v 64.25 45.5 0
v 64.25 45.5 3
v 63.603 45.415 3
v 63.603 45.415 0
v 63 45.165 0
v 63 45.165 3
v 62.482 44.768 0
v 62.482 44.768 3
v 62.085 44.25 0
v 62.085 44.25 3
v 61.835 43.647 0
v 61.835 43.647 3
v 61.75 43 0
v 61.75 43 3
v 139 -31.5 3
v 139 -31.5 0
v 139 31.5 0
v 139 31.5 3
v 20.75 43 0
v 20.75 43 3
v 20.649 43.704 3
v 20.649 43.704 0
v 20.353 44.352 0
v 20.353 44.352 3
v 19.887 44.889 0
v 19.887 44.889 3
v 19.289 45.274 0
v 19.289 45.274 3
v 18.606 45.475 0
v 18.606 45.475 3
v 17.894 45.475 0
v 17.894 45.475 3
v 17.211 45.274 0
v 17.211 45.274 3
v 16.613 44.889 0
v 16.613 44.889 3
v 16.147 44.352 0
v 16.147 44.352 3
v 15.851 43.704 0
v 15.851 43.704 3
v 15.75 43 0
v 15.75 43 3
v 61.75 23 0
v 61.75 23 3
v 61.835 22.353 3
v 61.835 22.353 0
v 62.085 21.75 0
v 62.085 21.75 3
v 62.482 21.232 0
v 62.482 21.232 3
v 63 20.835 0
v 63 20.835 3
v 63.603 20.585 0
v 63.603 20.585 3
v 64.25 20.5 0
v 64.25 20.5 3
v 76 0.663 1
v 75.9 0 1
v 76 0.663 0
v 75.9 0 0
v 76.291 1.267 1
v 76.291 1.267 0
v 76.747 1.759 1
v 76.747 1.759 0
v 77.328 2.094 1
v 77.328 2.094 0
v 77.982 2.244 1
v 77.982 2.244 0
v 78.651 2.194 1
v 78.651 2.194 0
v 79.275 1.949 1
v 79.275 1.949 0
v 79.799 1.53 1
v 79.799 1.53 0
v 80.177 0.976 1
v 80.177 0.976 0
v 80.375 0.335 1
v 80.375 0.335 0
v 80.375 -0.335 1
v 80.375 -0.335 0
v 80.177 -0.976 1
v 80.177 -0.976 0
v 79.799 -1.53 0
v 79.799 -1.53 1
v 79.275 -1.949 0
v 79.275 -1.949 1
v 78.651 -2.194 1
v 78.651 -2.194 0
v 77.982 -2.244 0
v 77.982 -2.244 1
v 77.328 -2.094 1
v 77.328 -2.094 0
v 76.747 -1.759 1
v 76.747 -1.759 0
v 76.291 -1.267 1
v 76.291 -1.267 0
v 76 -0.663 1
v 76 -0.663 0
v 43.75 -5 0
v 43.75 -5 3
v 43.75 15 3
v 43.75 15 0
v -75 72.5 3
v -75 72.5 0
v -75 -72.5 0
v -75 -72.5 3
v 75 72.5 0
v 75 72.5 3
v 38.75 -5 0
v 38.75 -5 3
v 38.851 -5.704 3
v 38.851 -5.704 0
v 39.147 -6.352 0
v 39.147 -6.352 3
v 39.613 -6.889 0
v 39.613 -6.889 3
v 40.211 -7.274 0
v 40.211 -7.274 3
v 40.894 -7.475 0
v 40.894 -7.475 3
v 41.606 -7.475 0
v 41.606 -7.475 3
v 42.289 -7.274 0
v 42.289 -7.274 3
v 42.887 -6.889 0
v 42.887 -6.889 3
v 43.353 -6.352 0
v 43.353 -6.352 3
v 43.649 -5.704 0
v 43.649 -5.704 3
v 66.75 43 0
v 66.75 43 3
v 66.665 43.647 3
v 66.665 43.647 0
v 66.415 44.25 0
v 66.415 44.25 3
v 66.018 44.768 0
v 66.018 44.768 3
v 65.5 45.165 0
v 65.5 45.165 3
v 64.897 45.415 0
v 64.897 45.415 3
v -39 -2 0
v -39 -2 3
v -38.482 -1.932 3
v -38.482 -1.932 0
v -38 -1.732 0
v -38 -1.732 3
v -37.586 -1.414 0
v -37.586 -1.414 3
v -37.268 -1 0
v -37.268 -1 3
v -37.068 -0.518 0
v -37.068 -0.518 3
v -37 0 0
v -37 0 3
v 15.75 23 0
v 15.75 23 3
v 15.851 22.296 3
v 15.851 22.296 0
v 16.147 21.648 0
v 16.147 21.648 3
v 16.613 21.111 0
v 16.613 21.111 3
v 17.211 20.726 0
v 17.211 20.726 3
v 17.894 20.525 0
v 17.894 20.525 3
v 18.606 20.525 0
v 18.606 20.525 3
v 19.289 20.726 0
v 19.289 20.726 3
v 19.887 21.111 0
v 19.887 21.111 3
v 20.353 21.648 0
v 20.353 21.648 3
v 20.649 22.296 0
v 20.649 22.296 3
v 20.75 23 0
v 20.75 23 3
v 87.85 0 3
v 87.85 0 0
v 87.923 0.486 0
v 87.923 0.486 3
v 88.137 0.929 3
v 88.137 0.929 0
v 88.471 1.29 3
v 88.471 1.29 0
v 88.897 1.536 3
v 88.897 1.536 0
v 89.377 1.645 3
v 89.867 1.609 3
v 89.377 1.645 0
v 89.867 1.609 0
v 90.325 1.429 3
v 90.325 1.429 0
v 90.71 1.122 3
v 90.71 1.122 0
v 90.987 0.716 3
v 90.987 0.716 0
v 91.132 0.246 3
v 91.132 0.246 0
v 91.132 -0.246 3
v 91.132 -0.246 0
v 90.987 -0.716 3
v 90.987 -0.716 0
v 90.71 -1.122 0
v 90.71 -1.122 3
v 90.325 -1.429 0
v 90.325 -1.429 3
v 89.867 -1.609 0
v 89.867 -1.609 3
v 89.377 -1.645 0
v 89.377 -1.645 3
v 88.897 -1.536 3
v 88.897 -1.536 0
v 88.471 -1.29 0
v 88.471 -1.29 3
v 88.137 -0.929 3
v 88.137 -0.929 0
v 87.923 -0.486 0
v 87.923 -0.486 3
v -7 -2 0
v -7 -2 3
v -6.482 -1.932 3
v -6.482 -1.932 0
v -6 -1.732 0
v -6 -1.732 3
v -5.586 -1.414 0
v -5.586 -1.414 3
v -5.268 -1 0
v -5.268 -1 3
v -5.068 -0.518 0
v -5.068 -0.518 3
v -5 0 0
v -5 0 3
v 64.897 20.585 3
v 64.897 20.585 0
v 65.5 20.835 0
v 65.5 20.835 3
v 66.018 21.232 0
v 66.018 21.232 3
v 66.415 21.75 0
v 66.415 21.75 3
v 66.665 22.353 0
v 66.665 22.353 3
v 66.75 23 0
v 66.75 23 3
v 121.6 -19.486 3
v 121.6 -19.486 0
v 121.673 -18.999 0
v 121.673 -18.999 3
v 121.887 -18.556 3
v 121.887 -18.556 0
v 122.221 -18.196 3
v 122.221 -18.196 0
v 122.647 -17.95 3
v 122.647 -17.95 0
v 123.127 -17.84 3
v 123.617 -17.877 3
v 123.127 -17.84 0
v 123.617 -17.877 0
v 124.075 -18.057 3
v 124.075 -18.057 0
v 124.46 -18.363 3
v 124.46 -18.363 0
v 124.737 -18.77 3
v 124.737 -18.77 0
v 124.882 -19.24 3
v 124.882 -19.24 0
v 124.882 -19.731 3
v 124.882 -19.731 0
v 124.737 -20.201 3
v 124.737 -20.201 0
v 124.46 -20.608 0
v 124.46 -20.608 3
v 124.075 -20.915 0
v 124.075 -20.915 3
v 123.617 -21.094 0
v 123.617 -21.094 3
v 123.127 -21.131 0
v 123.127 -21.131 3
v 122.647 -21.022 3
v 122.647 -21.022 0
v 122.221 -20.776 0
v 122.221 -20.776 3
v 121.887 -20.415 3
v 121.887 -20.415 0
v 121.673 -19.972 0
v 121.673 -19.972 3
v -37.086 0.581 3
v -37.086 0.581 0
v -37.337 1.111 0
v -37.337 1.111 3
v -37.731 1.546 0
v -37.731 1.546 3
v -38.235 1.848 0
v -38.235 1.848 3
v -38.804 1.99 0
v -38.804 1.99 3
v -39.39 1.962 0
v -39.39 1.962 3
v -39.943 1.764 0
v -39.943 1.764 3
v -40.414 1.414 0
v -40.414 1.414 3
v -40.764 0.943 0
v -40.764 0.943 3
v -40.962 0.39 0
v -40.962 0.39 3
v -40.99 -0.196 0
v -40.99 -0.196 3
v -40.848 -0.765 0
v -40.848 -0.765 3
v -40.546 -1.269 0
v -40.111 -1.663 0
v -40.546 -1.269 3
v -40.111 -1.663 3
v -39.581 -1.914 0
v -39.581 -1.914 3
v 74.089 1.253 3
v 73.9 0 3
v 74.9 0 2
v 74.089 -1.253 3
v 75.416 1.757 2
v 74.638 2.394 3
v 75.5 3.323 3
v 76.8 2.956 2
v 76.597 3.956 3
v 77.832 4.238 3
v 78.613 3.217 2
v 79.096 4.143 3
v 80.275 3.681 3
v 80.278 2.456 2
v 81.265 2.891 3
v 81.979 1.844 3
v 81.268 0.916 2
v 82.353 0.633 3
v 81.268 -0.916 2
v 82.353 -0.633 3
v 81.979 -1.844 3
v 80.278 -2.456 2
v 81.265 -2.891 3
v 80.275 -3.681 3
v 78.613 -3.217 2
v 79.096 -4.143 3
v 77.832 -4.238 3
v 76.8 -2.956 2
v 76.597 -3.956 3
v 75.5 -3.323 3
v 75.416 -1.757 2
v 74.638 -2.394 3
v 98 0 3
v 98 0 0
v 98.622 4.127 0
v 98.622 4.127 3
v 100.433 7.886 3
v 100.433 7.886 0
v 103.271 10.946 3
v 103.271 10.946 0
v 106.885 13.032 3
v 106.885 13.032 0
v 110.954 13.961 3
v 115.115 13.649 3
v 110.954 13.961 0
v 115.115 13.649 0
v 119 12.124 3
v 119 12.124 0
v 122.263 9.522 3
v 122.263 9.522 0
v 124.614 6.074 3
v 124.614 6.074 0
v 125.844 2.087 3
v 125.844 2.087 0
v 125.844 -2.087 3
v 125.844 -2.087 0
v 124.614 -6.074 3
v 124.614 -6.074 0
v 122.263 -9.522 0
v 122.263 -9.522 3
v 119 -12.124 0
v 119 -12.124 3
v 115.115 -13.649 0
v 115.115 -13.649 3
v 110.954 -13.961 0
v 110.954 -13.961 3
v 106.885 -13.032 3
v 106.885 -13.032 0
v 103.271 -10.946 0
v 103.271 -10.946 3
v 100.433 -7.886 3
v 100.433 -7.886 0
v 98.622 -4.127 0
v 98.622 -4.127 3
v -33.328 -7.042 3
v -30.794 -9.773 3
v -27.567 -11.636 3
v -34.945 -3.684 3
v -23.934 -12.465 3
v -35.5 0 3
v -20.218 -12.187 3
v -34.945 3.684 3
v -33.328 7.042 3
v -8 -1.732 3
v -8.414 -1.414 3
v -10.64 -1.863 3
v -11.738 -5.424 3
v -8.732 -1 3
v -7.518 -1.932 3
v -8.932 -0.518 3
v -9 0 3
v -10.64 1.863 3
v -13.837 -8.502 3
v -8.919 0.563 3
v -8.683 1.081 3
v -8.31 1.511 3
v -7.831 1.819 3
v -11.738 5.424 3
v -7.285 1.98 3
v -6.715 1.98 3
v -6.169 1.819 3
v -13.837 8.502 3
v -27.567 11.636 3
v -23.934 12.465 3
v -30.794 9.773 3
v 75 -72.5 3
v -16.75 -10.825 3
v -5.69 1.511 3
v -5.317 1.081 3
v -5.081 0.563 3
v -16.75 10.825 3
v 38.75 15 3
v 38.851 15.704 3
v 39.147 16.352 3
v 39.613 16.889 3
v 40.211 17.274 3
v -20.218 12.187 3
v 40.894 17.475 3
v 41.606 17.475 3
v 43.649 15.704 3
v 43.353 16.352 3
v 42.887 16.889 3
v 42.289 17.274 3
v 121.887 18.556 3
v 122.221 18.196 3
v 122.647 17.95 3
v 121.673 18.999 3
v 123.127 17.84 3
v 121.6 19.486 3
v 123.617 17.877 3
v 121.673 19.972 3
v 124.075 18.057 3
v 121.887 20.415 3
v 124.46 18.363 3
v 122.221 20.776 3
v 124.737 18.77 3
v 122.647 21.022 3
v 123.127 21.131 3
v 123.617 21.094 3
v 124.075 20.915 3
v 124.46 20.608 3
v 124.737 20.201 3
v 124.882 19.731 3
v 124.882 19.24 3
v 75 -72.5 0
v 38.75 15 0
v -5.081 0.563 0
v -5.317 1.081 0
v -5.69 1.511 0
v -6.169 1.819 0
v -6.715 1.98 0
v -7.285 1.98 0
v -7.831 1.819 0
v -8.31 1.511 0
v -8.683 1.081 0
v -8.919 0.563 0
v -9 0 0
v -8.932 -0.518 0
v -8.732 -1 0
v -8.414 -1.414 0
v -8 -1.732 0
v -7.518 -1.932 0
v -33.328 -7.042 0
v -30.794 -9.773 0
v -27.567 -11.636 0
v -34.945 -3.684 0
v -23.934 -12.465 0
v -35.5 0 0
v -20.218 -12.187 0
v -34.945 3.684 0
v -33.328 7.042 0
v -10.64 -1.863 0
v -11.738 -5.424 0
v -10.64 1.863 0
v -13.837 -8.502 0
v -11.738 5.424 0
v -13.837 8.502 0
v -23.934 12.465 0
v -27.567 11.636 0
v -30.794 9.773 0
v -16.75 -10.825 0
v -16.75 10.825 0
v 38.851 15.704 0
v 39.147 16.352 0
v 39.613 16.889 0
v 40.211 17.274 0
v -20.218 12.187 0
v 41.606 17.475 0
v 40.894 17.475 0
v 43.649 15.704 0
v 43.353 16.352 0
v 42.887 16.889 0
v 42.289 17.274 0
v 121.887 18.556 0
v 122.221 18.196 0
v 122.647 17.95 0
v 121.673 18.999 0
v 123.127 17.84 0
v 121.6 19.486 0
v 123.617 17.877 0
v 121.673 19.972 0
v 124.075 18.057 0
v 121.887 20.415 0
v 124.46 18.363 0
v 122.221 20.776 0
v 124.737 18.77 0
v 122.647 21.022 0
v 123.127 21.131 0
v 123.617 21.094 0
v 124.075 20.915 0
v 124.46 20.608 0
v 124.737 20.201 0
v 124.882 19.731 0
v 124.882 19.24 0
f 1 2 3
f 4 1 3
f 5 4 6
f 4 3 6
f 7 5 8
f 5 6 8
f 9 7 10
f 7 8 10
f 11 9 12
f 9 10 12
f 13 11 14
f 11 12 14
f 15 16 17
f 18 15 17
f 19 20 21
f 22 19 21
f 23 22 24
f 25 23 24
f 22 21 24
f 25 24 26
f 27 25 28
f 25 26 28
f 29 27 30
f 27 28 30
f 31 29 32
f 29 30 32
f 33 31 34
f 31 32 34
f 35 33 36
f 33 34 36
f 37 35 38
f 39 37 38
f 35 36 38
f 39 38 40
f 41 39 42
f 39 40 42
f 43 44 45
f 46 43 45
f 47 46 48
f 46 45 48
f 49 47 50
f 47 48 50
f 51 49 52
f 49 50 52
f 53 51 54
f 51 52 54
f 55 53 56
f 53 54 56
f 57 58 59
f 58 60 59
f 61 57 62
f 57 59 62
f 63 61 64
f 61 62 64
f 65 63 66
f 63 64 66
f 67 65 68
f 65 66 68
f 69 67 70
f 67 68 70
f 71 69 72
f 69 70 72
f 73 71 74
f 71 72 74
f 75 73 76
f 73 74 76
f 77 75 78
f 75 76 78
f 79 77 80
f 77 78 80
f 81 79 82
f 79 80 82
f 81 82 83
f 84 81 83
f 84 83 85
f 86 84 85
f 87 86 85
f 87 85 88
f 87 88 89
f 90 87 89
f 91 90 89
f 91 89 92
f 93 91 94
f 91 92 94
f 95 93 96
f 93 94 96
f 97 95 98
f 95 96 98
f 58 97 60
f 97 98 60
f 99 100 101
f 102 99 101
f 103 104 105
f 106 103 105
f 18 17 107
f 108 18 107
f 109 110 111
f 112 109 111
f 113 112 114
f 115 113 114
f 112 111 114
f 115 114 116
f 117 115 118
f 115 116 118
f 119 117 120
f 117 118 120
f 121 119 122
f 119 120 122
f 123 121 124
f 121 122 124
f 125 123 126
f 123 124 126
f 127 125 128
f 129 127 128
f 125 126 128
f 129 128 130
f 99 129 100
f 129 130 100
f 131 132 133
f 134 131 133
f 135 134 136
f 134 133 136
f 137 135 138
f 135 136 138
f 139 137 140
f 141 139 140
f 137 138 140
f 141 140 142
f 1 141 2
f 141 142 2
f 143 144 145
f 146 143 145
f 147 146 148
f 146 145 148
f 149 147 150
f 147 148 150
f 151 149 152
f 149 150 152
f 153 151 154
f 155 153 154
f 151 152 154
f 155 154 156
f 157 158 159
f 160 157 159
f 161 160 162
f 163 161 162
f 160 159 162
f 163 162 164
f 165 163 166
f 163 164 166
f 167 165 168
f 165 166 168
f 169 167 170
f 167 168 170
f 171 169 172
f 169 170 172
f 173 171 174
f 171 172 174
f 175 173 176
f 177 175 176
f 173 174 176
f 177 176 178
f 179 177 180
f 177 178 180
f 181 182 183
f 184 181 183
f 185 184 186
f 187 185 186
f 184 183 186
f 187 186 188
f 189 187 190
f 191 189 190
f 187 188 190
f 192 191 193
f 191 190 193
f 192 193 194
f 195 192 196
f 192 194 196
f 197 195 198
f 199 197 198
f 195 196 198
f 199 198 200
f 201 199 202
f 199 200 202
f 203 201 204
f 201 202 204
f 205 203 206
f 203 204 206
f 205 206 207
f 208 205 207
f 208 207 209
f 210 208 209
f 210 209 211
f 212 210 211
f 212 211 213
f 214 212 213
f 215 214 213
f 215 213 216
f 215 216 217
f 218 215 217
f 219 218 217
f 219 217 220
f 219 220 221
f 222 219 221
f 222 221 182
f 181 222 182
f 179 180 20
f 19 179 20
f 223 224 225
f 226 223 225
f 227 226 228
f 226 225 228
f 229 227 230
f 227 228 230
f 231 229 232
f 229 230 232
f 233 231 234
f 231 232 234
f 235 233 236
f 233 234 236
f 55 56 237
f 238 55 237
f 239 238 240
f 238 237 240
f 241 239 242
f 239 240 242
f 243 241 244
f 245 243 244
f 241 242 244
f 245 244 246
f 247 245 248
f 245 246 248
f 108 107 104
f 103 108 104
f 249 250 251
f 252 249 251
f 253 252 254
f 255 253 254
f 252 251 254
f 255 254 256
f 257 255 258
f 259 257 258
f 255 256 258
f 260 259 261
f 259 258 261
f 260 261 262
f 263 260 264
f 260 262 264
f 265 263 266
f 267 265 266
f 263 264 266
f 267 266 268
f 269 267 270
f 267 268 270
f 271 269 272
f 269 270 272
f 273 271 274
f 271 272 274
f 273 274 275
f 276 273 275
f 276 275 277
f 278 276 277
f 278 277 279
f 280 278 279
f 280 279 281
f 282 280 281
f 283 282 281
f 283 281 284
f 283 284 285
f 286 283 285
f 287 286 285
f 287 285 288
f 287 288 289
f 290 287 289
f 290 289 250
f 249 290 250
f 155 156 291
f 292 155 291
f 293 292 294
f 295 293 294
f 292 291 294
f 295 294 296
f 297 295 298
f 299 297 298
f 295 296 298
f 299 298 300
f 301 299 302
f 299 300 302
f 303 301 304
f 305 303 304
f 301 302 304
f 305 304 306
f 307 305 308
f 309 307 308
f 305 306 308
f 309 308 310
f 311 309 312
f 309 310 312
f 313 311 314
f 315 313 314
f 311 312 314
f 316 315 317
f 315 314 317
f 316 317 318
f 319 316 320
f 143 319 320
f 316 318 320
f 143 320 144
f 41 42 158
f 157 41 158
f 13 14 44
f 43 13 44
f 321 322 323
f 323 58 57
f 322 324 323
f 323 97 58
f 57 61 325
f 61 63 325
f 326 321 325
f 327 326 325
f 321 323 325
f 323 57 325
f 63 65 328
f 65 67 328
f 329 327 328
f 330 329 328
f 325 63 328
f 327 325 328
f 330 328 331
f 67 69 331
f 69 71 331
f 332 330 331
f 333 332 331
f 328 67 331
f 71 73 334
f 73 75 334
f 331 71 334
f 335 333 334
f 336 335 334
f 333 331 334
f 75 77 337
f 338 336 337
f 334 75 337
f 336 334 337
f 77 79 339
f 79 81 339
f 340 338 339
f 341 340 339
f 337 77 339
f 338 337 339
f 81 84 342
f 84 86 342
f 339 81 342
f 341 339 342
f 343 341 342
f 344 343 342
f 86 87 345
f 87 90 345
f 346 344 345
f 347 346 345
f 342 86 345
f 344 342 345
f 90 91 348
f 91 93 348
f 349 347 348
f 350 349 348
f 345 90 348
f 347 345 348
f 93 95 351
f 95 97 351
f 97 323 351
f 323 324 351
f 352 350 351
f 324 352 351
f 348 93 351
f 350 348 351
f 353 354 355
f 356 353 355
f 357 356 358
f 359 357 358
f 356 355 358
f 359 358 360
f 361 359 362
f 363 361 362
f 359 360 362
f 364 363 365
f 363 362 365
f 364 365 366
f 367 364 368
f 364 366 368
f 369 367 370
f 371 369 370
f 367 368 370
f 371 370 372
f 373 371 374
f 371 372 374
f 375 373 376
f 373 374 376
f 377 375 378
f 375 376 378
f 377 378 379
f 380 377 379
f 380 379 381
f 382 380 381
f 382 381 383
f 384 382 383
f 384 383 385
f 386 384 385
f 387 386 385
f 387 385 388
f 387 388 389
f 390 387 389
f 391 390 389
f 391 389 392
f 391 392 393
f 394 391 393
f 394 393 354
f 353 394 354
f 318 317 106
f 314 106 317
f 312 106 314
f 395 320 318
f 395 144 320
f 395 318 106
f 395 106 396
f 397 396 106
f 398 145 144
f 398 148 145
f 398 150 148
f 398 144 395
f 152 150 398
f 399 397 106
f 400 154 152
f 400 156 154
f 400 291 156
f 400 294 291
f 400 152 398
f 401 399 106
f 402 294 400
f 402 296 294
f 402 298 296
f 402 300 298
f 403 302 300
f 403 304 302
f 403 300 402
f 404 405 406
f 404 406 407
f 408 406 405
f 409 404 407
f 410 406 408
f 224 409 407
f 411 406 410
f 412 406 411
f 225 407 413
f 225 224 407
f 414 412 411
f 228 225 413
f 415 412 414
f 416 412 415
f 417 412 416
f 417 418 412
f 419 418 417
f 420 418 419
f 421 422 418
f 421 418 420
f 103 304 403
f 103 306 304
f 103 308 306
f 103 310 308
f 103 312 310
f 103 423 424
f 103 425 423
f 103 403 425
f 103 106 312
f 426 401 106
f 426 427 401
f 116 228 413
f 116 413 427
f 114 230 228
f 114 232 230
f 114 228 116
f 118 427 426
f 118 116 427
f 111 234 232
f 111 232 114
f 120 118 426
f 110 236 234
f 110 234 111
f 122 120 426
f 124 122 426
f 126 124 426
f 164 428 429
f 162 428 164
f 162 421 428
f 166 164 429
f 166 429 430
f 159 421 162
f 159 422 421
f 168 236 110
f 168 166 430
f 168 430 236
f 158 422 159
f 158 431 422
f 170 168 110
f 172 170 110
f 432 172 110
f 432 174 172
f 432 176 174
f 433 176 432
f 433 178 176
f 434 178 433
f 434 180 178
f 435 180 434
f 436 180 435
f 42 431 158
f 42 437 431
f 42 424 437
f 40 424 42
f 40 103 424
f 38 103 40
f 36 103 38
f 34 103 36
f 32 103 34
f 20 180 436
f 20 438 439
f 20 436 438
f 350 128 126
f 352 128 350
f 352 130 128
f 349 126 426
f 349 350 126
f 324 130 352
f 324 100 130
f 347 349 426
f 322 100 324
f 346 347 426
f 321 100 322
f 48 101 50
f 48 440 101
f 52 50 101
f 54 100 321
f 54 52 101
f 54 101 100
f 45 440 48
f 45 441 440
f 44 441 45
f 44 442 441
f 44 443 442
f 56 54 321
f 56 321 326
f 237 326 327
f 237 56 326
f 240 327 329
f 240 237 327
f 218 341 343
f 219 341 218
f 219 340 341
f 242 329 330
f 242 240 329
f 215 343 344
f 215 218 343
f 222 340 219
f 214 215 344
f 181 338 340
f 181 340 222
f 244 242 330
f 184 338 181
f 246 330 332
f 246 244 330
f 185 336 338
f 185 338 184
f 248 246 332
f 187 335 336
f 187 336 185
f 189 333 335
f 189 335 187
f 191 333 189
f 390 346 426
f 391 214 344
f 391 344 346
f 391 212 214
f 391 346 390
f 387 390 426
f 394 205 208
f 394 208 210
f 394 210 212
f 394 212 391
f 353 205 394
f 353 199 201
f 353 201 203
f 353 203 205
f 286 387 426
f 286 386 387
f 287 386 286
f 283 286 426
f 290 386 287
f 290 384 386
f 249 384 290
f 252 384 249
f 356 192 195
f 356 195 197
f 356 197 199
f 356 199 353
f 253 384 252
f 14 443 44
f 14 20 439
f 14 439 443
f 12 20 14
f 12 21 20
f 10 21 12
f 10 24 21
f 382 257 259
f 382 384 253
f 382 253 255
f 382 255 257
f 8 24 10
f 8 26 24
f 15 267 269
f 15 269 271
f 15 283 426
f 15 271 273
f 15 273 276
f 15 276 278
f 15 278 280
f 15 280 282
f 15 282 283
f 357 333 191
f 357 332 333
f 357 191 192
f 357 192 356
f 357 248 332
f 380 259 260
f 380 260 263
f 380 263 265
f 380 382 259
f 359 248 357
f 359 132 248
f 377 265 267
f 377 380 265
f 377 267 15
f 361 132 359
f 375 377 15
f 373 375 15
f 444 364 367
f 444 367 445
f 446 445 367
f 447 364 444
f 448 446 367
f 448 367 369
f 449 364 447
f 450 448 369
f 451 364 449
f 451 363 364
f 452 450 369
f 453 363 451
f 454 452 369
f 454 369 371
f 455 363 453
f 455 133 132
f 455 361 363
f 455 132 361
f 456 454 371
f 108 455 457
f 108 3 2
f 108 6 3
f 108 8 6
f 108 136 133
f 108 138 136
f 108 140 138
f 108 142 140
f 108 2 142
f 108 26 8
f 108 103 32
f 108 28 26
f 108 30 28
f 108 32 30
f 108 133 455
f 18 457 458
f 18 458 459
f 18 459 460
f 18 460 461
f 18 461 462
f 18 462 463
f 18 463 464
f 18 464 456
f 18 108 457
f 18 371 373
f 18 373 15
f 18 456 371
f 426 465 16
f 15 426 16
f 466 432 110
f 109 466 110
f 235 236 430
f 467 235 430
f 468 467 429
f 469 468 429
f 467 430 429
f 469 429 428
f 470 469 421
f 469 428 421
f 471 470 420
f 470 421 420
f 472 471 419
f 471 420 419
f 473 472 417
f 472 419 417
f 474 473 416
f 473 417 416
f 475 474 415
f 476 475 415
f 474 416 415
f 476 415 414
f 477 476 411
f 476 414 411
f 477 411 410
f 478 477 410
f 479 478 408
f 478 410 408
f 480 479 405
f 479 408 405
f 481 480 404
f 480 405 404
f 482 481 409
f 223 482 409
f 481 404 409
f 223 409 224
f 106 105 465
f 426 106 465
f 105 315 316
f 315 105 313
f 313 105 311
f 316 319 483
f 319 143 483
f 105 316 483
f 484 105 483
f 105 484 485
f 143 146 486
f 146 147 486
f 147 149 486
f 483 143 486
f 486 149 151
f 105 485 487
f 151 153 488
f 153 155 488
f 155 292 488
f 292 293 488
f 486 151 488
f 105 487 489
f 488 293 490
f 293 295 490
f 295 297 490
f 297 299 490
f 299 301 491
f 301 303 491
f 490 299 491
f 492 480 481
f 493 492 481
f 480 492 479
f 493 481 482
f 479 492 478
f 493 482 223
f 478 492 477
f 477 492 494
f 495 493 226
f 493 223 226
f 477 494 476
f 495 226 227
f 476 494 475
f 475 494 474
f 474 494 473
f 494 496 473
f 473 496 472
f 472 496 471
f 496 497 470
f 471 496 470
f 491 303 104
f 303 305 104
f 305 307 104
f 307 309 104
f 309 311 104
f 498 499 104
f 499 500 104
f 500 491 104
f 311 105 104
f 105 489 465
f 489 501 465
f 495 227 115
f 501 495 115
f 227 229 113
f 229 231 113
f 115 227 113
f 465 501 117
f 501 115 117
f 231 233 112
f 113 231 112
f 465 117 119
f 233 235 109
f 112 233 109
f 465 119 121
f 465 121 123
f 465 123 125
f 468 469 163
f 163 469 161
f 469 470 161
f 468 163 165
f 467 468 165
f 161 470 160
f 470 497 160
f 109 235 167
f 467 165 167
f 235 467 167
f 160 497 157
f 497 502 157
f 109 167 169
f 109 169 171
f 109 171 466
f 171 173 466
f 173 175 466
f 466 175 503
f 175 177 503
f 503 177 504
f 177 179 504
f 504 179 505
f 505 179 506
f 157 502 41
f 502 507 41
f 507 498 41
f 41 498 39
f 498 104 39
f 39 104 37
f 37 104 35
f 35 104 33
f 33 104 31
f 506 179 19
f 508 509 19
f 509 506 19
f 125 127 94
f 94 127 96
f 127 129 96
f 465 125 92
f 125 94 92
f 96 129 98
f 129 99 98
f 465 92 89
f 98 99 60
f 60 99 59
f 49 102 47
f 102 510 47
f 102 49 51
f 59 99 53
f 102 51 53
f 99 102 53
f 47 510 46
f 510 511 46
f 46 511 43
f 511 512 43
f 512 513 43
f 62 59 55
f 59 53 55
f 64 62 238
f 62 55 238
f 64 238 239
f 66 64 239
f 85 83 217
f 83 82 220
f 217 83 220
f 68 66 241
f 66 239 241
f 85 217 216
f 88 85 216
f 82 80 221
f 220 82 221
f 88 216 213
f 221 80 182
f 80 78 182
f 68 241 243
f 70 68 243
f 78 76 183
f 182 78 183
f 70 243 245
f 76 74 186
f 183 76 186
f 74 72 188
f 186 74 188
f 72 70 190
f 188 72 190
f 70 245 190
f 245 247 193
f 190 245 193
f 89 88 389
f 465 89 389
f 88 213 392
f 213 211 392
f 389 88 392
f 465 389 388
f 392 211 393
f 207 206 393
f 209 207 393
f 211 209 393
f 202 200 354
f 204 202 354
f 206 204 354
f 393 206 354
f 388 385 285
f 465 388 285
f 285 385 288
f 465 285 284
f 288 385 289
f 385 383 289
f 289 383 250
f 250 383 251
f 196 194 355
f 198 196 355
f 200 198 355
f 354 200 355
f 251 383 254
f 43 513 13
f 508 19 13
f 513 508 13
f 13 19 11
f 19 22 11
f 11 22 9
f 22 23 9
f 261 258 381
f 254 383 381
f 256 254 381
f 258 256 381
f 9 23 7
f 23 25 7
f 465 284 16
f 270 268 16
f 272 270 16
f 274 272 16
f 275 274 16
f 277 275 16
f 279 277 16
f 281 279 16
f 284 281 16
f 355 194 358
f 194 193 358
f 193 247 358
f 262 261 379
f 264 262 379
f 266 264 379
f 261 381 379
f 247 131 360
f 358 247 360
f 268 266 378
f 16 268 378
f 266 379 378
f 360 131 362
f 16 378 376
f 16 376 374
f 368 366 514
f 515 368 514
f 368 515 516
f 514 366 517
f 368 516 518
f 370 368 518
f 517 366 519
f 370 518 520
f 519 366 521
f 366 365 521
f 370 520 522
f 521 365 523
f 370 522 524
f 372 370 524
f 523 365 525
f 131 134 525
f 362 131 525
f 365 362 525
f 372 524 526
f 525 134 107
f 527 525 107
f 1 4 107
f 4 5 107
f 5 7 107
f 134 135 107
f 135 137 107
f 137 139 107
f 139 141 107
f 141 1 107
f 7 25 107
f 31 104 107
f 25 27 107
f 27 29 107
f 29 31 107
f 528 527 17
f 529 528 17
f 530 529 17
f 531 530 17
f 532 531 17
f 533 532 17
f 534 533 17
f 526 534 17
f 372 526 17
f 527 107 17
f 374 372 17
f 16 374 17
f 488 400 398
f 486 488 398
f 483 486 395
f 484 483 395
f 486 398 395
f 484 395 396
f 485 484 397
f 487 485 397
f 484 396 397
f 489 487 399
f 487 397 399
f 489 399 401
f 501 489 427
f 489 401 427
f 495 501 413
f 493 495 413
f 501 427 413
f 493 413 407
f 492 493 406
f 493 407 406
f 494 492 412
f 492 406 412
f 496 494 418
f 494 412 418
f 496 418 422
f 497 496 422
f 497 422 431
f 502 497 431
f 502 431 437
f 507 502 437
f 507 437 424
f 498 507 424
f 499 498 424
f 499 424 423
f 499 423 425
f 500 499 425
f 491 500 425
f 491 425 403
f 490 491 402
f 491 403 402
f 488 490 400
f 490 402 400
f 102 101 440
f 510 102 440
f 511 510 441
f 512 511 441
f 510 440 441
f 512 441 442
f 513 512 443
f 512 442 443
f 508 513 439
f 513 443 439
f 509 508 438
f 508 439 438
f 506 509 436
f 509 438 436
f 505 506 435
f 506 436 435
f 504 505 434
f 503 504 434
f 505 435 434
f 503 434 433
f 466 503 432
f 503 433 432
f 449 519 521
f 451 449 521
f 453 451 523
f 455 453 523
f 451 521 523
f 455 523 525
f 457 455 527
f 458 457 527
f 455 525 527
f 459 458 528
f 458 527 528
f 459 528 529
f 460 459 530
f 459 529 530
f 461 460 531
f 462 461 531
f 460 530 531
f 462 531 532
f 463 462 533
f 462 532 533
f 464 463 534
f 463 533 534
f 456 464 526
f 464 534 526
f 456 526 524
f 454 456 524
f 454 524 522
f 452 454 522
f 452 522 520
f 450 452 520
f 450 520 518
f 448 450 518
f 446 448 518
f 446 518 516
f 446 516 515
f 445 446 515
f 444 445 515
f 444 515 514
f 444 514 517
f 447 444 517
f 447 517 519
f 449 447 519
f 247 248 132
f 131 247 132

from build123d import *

# Parameters (mm, degrees)
F1_DEPTH        = 3
F3_D            = 28
F5_D            = 3.3
F7_DEPTH        = 3
F9_DEPTH        = 3
F11_D           = 4.5
F11_CSINK_D     = 8.5
F11_CSINK_ANGLE = 90


with BuildPart() as f1:
    # F0 (on Top) → F1 (new body)
    with BuildSketch(Plane.XY):
        Polygon((75, 0), (75, 72.5), (-75, 72.5), (-75, -72.5), (75, -72.5), align=None)
        Polygon((139, 31.5), (75, 72.5), (75, 0), (139, 0), align=None)
        Polygon((139, 0), (75, 0), (75, -72.5), (139, -31.5), align=None)
    extrude(amount=F1_DEPTH)

    # F3 (through all)
    with Locations(Plane.XY.offset(3)):
        with Locations((112, 0)):
            Hole(F3_D / 2)

    # F5 (through all)
    with Locations(Plane.XY.offset(3)):
        with Locations((89.5, 0), (123.25, -19.4855715851), (123.25, 19.4855715851)):
            Hole(F5_D / 2)

    # F6 (on face) → F7 (cut, through all)
    with BuildSketch(Plane.XY.offset(3)):
        with BuildLine():
            Line((-37, 0), (-39, 0))
            Line((-39, 0), (-39, -2))
            ThreePointArc((-39, -2), (-37.5857864376, -1.4142135624), (-37, 0))
        make_face()
        with BuildLine():
            Line((-39, -2), (-39, 0))
            Line((-39, 0), (-37, 0))
            ThreePointArc((-37, 0), (-40.4142135624, 1.4142135624), (-39, -2))
        make_face()
        with BuildLine():
            ThreePointArc((-5, 0), (-7, 2), (-9, 0))
            Line((-9, 0), (-7, 0))
            Line((-7, 0), (-7, -2))
            ThreePointArc((-7, -2), (-5.5857864376, -1.4142135624), (-5, 0))
        make_face()
        with BuildLine():
            Line((-7, 0), (-9, 0))
            ThreePointArc((-9, 0), (-8.4142135624, -1.4142135624), (-7, -2))
            Line((-7, -2), (-7, 0))
        make_face()
        with BuildLine():
            ThreePointArc((-10.5, 0), (-23, 12.5), (-35.5, 0))
            Line((-35.5, 0), (-10.5, 0))
        make_face()
        with BuildLine():
            Line((-10.5, 0), (-35.5, 0))
            ThreePointArc((-35.5, 0), (-23, -12.5), (-10.5, 0))
        make_face()
    extrude(amount=-F7_DEPTH, mode=Mode.SUBTRACT)

    # F8 (on face) → F9 (cut, through all)
    with BuildSketch(Plane.XY.offset(3)):
        with BuildLine():
            Line((38.75, 15), (38.75, -5))
            ThreePointArc((38.75, -5), (41.25, -7.5), (43.75, -5))
            Line((43.75, -5), (43.75, 15))
            ThreePointArc((43.75, 15), (41.25, 17.5), (38.75, 15))
        make_face()
        with BuildLine():
            ThreePointArc((61.75, 23), (62.482233047, 21.232233047), (64.25, 20.5))
            Line((64.25, 20.5), (64.25, 45.5))
            ThreePointArc((64.25, 45.5), (62.482233047, 44.767766953), (61.75, 43))
            Line((61.75, 43), (61.75, 23))
        make_face()
        with BuildLine():
            Line((64.25, 45.5), (64.25, 20.5))
            ThreePointArc((64.25, 20.5), (66.017766953, 21.232233047), (66.75, 23))
            Line((66.75, 23), (66.75, 43))
            ThreePointArc((66.75, 43), (66.017766953, 44.767766953), (64.25, 45.5))
        make_face()
        with BuildLine():
            Line((20.75, 23), (20.75, 43))
            ThreePointArc((20.75, 43), (18.25, 45.5), (15.75, 43))
            Line((15.75, 43), (15.75, 23))
            ThreePointArc((15.75, 23), (18.25, 20.5), (20.75, 23))
        make_face()
    extrude(amount=-F9_DEPTH, mode=Mode.SUBTRACT)

    # F11 (through all)
    with Locations(Plane.XY.offset(3)):
        with Locations((78.15, 0)):
            CounterSinkHole(F11_D / 2, F11_CSINK_D / 2, counter_sink_angle=F11_CSINK_ANGLE)


solid = f1.part
